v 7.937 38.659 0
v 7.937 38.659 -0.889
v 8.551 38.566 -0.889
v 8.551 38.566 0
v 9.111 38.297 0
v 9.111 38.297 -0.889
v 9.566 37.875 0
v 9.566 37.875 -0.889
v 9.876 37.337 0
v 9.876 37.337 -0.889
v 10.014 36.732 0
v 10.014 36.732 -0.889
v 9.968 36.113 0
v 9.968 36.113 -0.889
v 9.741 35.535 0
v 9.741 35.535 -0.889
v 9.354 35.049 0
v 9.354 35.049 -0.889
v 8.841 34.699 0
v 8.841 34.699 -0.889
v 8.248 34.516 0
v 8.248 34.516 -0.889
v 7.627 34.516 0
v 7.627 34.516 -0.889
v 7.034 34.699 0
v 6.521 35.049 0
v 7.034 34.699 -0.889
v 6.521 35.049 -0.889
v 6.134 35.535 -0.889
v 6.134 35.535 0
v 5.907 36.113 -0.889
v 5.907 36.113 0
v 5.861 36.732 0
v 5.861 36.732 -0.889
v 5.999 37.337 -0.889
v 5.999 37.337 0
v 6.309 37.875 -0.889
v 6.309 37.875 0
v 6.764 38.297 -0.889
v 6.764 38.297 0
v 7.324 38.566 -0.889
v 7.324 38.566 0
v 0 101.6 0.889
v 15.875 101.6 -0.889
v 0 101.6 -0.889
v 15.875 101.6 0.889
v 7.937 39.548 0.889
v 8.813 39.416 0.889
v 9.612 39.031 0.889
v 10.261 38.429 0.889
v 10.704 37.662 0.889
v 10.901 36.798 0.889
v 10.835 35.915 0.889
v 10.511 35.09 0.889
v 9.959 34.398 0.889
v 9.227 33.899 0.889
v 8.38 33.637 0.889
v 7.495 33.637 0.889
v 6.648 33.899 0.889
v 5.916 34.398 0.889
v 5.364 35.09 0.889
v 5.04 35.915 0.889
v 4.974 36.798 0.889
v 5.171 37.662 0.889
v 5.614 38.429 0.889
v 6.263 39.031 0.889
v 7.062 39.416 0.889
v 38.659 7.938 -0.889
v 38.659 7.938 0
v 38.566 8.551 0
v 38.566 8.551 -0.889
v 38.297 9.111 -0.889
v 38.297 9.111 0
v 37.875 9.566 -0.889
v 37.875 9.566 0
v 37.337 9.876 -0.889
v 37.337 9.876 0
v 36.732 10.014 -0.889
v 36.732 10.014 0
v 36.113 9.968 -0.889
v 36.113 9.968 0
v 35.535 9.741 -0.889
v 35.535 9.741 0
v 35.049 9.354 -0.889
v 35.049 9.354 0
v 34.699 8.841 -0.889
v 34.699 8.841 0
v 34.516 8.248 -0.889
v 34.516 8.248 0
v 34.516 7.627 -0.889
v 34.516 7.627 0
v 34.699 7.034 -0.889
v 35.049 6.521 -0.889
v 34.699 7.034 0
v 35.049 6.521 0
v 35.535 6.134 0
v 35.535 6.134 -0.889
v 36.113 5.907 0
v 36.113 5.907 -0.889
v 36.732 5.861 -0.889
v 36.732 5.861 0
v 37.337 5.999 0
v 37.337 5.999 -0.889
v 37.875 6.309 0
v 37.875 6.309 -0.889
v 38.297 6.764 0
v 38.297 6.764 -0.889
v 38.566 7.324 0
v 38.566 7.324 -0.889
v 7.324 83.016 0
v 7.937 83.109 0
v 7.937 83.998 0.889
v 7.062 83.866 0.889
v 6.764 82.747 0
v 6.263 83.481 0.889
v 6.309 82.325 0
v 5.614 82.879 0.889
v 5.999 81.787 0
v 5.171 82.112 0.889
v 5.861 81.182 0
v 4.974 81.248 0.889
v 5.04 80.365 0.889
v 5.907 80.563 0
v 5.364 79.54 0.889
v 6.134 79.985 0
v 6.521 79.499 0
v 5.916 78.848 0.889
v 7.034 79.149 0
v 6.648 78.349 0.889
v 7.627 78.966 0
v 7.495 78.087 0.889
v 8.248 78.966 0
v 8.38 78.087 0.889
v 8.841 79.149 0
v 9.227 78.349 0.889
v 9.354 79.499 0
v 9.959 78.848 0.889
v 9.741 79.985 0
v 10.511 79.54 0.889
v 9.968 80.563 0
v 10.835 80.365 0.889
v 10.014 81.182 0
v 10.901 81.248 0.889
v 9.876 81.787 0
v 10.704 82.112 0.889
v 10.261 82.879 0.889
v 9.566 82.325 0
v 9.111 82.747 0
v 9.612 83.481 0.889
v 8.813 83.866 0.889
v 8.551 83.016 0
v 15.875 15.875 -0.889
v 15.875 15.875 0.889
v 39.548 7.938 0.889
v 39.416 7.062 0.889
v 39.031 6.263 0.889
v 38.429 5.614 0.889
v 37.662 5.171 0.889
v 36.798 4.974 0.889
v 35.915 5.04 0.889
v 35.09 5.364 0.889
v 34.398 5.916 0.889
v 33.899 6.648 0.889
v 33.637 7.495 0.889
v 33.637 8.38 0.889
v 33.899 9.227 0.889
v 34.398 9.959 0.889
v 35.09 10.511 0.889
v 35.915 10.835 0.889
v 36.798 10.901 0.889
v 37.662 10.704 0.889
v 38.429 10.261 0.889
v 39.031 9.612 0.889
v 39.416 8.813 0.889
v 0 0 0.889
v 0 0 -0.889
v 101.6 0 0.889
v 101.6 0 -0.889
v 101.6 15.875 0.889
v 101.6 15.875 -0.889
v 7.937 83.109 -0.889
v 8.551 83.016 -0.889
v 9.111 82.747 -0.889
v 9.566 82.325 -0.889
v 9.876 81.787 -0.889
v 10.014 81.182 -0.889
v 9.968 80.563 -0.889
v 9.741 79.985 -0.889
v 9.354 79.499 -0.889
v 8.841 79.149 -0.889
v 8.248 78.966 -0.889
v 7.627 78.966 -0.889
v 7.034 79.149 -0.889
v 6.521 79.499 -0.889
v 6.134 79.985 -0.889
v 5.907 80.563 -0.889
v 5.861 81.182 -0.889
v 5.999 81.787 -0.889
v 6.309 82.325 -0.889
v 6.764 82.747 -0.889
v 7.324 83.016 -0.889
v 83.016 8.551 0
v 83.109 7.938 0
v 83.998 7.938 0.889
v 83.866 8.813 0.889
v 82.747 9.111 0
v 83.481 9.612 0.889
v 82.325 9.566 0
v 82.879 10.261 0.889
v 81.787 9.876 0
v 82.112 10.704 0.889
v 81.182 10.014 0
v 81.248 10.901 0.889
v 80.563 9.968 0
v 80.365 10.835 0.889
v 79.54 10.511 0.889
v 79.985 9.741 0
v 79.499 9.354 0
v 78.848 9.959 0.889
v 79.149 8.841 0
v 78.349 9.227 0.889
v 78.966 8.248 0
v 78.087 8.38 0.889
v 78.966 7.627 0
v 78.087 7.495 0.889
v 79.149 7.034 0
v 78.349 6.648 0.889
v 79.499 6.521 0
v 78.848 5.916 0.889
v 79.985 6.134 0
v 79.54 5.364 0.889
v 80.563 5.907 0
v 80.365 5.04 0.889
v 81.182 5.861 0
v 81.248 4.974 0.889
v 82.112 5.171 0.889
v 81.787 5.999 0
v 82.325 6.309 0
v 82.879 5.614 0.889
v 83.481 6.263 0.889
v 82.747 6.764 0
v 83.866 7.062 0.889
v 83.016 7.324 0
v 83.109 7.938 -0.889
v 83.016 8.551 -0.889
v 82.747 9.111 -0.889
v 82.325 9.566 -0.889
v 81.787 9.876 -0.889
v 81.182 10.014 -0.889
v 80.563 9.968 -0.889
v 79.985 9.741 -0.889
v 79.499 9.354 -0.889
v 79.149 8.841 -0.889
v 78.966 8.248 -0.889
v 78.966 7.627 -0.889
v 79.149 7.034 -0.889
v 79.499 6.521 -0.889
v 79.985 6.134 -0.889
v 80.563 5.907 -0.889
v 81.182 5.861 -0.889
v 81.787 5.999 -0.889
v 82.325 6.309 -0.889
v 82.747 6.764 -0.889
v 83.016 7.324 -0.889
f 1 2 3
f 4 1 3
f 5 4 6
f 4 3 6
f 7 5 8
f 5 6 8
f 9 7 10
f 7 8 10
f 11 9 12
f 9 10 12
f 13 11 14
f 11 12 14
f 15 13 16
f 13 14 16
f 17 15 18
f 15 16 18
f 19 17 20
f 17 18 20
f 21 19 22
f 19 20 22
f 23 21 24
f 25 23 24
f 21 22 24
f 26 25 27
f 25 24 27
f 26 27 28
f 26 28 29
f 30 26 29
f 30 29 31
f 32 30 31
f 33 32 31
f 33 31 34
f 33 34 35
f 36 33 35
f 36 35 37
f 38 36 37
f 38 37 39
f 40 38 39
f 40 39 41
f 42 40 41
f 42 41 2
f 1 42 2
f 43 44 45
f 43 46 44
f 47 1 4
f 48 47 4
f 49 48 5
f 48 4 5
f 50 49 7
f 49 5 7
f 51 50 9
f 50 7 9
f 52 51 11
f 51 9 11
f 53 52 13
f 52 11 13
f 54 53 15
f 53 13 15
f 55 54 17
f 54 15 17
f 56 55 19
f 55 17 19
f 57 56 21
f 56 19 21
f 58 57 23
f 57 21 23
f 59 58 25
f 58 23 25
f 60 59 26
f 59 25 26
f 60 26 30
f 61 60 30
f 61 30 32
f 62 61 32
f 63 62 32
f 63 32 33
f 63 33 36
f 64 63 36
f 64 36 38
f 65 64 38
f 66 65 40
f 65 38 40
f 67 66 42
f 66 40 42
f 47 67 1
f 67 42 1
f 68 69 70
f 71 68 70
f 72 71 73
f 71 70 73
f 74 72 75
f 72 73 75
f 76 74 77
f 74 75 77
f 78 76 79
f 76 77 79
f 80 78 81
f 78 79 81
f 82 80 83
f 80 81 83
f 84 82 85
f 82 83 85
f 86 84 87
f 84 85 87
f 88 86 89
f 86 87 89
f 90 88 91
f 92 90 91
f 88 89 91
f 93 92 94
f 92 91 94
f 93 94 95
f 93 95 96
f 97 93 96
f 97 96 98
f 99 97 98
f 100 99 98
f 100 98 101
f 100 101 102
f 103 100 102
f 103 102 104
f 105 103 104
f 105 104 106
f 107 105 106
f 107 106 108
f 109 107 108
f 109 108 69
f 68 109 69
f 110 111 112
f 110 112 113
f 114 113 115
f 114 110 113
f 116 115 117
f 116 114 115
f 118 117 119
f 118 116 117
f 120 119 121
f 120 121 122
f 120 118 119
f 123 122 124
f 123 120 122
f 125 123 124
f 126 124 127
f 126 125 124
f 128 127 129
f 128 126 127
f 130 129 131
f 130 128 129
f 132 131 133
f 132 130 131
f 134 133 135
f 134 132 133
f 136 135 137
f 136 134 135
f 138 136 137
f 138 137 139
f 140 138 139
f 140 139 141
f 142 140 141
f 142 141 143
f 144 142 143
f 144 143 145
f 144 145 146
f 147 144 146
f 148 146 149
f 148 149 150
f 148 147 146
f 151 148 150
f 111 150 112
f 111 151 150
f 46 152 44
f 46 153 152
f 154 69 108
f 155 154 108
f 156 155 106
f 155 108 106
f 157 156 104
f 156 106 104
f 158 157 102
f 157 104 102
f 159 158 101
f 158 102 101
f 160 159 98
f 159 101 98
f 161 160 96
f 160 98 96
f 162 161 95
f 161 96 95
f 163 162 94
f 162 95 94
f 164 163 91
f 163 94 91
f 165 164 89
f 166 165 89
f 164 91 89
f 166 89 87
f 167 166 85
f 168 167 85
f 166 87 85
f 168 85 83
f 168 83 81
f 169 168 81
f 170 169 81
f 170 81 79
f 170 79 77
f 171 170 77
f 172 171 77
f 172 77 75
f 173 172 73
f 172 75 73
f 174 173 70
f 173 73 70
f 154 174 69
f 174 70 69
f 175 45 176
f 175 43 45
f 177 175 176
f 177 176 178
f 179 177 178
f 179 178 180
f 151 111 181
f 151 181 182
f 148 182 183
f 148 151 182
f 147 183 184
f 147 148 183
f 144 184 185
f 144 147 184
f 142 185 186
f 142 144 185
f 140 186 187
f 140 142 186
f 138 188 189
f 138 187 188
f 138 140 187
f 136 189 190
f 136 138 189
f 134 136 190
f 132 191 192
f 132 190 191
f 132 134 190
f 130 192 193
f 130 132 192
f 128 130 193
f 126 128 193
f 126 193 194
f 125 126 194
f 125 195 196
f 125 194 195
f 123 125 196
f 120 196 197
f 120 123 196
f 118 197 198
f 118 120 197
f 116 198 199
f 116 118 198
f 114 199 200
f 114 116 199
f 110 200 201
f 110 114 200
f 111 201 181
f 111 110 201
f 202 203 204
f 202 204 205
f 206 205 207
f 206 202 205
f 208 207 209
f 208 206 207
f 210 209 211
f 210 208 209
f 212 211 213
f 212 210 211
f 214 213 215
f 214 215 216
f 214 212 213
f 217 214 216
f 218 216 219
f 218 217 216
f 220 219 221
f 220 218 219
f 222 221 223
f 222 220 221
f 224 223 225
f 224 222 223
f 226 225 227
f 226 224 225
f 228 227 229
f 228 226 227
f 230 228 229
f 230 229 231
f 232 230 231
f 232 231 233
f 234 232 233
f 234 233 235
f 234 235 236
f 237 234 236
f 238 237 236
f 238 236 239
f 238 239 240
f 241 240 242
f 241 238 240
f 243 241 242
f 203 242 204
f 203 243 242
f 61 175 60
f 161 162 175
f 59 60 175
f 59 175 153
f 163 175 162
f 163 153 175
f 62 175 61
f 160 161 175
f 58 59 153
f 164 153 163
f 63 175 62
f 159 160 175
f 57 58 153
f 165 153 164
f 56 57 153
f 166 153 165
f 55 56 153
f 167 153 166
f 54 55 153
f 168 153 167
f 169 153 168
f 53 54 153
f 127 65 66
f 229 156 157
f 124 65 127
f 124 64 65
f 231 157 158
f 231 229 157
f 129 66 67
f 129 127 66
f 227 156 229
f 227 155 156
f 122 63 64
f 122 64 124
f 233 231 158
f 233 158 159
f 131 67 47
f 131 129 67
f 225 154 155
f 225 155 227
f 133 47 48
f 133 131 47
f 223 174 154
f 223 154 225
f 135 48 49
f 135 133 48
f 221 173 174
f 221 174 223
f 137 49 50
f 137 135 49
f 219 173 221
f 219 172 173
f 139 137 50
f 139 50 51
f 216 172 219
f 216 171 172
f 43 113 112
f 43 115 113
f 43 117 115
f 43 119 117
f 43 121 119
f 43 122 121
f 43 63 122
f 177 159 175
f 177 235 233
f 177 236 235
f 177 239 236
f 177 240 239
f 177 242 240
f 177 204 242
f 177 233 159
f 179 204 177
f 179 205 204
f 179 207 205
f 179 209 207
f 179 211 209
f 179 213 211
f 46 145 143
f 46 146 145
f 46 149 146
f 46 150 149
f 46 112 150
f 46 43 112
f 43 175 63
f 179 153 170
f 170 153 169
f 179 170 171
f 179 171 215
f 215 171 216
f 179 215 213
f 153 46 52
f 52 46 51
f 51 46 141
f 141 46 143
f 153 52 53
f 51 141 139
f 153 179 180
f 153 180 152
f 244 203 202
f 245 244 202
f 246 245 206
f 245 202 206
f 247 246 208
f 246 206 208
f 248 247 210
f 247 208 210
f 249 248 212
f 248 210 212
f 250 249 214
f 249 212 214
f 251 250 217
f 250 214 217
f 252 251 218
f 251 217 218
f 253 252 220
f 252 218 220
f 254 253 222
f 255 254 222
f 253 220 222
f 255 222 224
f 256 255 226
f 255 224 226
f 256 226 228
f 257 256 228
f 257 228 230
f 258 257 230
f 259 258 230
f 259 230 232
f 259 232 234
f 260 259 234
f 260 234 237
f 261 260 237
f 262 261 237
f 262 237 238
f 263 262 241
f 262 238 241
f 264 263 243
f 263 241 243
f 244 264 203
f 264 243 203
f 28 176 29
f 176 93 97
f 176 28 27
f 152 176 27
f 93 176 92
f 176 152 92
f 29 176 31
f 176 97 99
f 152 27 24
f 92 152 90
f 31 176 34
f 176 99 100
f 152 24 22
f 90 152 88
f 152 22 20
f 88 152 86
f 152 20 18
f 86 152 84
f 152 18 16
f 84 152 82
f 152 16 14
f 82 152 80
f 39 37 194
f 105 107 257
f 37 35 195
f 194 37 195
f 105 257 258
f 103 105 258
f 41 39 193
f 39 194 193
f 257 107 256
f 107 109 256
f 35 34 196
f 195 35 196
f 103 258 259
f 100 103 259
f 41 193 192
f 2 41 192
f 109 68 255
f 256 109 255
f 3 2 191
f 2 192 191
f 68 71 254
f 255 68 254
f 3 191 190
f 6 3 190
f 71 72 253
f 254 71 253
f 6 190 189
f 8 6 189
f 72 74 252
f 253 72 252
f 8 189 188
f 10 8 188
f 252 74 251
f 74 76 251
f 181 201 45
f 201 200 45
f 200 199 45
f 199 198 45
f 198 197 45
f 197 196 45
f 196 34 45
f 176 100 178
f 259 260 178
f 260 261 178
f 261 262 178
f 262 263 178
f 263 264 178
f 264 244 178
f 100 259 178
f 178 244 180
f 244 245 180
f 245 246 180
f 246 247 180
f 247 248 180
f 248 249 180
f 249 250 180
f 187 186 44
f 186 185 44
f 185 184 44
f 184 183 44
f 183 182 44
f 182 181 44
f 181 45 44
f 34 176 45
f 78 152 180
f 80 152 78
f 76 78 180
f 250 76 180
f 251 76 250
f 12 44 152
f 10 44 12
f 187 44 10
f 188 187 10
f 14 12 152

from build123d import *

# Parameters (mm, degrees)
EXTRUDE1_DEPTH           = 0.889
SKETCH2_R                = 2.0828
EXTRUDE2_DEPTH           = 144.686848114
CHAMFER1_SIZE            = 0.889
CHAMFER1_OF_MIRROR1_SIZE = 0.889


with BuildPart() as part:
    # Sketch1 → Extrude1 (new, symmetric)
    with BuildSketch(Plane.XY):
        Polygon((0, 101.6), (0, 0), (101.6, 0), (101.6, 15.875), (15.875, 15.875), (15.875, 101.6), align=None)
    extrude(amount=EXTRUDE1_DEPTH, both=True)

    # Sketch2 → Extrude2 (cut, symmetric)
    with BuildSketch(Plane.XY):
        with Locations((-14.224, 7.9375)):
            Circle(SKETCH2_R)
        with Locations((36.576, 7.9375)):
            Circle(SKETCH2_R)
        with Locations((81.026, 7.9375)):
            Circle(SKETCH2_R)
    extrude2 = extrude(amount=EXTRUDE2_DEPTH, both=True, mode=Mode.SUBTRACT)

    # Chamfer1
    chamfer1_edges = [part.edges().sort_by_distance(p)[0] for p in [
        (34.4932, 7.9375, 0.889),
        (78.9432, 7.9375, 0.889),
    ]]
    chamfer(chamfer1_edges, length=CHAMFER1_SIZE)

    # Mirror1: Extrude2 across plane
    add(extrude2.mirror(Plane(origin=(0, 0, 0), x_dir=(0, 0, 1), z_dir=(-0.7071067811865477, 0.7071067811865474, 0))), mode=Mode.SUBTRACT)

    # Chamfer1 of Mirror1
    chamfer1_of_mirror1_edges = [part.edges().sort_by_distance(p)[0] for p in [
        (7.9375, 34.4932, 0.889),
        (7.9375, 78.9432, 0.889),
    ]]
    chamfer(chamfer1_of_mirror1_edges, length=CHAMFER1_OF_MIRROR1_SIZE)


solid = part.part
